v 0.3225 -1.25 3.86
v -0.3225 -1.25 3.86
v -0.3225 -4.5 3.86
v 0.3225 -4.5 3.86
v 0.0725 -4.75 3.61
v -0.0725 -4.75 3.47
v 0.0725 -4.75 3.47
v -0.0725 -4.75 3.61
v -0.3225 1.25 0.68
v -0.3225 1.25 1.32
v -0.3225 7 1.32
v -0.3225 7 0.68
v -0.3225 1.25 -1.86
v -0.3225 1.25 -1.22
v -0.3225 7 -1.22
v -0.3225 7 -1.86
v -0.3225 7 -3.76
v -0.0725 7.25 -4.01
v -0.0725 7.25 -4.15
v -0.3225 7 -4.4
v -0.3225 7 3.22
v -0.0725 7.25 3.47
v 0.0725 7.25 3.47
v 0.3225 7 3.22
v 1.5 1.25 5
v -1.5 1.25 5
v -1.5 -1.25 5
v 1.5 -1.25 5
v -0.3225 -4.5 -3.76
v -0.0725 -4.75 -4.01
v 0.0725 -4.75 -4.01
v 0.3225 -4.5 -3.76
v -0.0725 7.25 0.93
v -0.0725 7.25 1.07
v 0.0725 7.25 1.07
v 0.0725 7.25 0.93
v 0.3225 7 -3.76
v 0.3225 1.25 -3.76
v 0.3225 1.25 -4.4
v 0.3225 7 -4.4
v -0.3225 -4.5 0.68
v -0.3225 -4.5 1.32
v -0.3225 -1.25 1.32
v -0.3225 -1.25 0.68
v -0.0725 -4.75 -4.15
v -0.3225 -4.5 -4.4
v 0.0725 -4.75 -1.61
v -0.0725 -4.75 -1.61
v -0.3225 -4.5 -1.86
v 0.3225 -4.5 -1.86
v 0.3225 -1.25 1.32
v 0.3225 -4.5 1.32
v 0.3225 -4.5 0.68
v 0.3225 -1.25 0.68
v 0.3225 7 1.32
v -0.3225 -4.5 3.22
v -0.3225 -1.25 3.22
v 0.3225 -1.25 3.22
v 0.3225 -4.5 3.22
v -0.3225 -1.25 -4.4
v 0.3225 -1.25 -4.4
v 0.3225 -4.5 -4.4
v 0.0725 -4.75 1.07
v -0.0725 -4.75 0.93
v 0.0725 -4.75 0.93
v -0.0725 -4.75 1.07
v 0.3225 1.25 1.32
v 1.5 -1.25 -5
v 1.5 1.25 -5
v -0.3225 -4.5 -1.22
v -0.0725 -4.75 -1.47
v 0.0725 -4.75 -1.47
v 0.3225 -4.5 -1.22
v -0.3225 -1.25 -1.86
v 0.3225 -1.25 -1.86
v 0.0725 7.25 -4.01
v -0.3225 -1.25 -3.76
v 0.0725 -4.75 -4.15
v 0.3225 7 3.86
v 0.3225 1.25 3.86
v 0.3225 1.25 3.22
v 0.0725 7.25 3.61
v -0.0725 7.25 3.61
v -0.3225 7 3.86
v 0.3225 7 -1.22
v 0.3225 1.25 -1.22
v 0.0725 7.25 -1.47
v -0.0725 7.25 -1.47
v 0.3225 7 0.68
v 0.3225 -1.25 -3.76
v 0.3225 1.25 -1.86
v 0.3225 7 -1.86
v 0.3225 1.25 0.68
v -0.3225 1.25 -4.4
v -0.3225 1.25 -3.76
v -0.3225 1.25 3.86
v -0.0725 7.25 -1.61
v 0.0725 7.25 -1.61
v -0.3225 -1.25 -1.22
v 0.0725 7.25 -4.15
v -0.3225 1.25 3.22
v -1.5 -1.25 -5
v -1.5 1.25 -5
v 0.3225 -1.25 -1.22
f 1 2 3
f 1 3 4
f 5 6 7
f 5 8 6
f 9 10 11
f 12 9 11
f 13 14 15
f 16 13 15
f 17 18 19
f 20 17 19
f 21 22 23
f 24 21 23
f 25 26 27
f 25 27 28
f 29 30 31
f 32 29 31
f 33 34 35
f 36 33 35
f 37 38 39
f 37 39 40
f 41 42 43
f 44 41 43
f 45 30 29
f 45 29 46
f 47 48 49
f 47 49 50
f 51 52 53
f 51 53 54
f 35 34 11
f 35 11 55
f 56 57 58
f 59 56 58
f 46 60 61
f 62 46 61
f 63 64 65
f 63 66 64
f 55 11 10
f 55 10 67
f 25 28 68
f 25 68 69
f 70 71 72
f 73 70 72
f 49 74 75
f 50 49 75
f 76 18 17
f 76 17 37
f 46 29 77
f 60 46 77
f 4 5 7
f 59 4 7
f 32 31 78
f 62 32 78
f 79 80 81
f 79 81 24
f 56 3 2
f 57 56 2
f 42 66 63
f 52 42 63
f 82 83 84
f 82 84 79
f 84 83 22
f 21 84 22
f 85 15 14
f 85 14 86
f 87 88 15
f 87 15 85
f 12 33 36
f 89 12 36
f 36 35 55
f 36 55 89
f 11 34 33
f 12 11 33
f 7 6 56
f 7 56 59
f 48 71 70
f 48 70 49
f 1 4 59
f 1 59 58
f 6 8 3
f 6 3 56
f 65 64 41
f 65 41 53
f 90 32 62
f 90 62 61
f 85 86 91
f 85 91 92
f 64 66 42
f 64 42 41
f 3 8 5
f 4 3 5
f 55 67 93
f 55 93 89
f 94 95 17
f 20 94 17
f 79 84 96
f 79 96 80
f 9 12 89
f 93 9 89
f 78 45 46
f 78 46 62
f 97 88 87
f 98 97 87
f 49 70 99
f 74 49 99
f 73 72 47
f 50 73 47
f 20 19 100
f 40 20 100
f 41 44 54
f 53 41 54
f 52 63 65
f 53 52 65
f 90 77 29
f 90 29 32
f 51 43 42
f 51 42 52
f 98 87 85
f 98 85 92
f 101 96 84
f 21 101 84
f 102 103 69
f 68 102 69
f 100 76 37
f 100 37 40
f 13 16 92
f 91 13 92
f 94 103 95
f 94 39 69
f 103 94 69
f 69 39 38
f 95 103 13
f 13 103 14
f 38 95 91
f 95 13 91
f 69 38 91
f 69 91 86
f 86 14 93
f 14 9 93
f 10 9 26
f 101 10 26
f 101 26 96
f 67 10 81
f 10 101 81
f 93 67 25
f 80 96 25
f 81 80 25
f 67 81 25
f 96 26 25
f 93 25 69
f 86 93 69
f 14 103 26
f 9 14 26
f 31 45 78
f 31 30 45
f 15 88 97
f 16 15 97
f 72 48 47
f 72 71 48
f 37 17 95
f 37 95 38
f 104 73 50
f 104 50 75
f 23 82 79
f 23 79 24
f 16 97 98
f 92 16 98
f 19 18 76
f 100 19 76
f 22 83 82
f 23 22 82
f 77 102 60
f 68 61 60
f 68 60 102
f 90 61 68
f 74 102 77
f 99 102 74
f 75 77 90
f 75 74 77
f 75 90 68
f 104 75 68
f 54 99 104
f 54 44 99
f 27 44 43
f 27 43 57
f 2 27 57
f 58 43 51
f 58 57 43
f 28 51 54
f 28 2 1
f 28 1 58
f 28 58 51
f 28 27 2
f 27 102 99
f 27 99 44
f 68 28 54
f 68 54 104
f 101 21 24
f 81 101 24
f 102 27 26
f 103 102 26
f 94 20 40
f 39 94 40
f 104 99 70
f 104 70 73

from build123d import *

# Parameters (mm, degrees)
SKETCH1_W       = 3
SKETCH1_H       = 2.5
EXTRUDE1_DEPTH  = 5
SKETCH2_W       = 0.645
SKETCH2_H       = 6
SKETCH2_H_2     = 3.5
EXTRUDE2_DEPTH  = 0.64
LPATTERN1_COUNT = 4
LPATTERN1_PITCH = 2.54
CHAMFER1_SIZE   = 0.25


with BuildPart() as part:
    # Sketch1 → Extrude1 (new, symmetric)
    with BuildSketch(Plane.XY):
        Rectangle(SKETCH1_W, SKETCH1_H)
    extrude(amount=EXTRUDE1_DEPTH, both=True)

    # Sketch2 → Extrude2 (add)
    with BuildSketch(Plane.XY.offset(3.86)):
        with Locations((0, 4.25)):
            Rectangle(SKETCH2_W, SKETCH2_H)
        with Locations((0, -3)):
            Rectangle(SKETCH2_W, SKETCH2_H_2)
    extrude2 = extrude(amount=-EXTRUDE2_DEPTH)

    # LPattern1: Extrude2 ×4
    with Locations(*[(0, 0, -i * LPATTERN1_PITCH) for i in range(1, LPATTERN1_COUNT)]):
        add(extrude2)

    # Chamfer1
    chamfer1_edges = [part.edges().sort_by_distance(p)[0] for p in [
        (0.3225, 7.25, 3.54),
        (0, 7.25, 3.22),
        (-0.3225, 7.25, 3.54),
        (0, 7.25, 3.86),
        (0, -4.75, 3.22),
        (0.3225, -4.75, 3.54),
        (-0.3225, -4.75, 3.54),
        (0, -4.75, 3.86),
        (0.3225, 7.25, 1),
        (0, 7.25, 0.68),
        (-0.3225, 7.25, 1),
        (0, 7.25, 1.32),
        (0, -4.75, 0.68),
        (0.3225, -4.75, 1),
        (-0.3225, -4.75, 1),
        (0, -4.75, 1.32),
        (0.3225, 7.25, -1.54),
        (0, 7.25, -1.86),
        (-0.3225, 7.25, -1.54),
        (0, 7.25, -1.22),
        (0, -4.75, -1.86),
        (0.3225, -4.75, -1.54),
        (-0.3225, -4.75, -1.54),
        (0, -4.75, -1.22),
        (0.3225, 7.25, -4.08),
        (0, 7.25, -4.4),
        (-0.3225, 7.25, -4.08),
        (0, 7.25, -3.76),
        (0, -4.75, -4.4),
        (0.3225, -4.75, -4.08),
        (-0.3225, -4.75, -4.08),
        (0, -4.75, -3.76),
    ]]
    chamfer(chamfer1_edges, length=CHAMFER1_SIZE)


solid = part.part
